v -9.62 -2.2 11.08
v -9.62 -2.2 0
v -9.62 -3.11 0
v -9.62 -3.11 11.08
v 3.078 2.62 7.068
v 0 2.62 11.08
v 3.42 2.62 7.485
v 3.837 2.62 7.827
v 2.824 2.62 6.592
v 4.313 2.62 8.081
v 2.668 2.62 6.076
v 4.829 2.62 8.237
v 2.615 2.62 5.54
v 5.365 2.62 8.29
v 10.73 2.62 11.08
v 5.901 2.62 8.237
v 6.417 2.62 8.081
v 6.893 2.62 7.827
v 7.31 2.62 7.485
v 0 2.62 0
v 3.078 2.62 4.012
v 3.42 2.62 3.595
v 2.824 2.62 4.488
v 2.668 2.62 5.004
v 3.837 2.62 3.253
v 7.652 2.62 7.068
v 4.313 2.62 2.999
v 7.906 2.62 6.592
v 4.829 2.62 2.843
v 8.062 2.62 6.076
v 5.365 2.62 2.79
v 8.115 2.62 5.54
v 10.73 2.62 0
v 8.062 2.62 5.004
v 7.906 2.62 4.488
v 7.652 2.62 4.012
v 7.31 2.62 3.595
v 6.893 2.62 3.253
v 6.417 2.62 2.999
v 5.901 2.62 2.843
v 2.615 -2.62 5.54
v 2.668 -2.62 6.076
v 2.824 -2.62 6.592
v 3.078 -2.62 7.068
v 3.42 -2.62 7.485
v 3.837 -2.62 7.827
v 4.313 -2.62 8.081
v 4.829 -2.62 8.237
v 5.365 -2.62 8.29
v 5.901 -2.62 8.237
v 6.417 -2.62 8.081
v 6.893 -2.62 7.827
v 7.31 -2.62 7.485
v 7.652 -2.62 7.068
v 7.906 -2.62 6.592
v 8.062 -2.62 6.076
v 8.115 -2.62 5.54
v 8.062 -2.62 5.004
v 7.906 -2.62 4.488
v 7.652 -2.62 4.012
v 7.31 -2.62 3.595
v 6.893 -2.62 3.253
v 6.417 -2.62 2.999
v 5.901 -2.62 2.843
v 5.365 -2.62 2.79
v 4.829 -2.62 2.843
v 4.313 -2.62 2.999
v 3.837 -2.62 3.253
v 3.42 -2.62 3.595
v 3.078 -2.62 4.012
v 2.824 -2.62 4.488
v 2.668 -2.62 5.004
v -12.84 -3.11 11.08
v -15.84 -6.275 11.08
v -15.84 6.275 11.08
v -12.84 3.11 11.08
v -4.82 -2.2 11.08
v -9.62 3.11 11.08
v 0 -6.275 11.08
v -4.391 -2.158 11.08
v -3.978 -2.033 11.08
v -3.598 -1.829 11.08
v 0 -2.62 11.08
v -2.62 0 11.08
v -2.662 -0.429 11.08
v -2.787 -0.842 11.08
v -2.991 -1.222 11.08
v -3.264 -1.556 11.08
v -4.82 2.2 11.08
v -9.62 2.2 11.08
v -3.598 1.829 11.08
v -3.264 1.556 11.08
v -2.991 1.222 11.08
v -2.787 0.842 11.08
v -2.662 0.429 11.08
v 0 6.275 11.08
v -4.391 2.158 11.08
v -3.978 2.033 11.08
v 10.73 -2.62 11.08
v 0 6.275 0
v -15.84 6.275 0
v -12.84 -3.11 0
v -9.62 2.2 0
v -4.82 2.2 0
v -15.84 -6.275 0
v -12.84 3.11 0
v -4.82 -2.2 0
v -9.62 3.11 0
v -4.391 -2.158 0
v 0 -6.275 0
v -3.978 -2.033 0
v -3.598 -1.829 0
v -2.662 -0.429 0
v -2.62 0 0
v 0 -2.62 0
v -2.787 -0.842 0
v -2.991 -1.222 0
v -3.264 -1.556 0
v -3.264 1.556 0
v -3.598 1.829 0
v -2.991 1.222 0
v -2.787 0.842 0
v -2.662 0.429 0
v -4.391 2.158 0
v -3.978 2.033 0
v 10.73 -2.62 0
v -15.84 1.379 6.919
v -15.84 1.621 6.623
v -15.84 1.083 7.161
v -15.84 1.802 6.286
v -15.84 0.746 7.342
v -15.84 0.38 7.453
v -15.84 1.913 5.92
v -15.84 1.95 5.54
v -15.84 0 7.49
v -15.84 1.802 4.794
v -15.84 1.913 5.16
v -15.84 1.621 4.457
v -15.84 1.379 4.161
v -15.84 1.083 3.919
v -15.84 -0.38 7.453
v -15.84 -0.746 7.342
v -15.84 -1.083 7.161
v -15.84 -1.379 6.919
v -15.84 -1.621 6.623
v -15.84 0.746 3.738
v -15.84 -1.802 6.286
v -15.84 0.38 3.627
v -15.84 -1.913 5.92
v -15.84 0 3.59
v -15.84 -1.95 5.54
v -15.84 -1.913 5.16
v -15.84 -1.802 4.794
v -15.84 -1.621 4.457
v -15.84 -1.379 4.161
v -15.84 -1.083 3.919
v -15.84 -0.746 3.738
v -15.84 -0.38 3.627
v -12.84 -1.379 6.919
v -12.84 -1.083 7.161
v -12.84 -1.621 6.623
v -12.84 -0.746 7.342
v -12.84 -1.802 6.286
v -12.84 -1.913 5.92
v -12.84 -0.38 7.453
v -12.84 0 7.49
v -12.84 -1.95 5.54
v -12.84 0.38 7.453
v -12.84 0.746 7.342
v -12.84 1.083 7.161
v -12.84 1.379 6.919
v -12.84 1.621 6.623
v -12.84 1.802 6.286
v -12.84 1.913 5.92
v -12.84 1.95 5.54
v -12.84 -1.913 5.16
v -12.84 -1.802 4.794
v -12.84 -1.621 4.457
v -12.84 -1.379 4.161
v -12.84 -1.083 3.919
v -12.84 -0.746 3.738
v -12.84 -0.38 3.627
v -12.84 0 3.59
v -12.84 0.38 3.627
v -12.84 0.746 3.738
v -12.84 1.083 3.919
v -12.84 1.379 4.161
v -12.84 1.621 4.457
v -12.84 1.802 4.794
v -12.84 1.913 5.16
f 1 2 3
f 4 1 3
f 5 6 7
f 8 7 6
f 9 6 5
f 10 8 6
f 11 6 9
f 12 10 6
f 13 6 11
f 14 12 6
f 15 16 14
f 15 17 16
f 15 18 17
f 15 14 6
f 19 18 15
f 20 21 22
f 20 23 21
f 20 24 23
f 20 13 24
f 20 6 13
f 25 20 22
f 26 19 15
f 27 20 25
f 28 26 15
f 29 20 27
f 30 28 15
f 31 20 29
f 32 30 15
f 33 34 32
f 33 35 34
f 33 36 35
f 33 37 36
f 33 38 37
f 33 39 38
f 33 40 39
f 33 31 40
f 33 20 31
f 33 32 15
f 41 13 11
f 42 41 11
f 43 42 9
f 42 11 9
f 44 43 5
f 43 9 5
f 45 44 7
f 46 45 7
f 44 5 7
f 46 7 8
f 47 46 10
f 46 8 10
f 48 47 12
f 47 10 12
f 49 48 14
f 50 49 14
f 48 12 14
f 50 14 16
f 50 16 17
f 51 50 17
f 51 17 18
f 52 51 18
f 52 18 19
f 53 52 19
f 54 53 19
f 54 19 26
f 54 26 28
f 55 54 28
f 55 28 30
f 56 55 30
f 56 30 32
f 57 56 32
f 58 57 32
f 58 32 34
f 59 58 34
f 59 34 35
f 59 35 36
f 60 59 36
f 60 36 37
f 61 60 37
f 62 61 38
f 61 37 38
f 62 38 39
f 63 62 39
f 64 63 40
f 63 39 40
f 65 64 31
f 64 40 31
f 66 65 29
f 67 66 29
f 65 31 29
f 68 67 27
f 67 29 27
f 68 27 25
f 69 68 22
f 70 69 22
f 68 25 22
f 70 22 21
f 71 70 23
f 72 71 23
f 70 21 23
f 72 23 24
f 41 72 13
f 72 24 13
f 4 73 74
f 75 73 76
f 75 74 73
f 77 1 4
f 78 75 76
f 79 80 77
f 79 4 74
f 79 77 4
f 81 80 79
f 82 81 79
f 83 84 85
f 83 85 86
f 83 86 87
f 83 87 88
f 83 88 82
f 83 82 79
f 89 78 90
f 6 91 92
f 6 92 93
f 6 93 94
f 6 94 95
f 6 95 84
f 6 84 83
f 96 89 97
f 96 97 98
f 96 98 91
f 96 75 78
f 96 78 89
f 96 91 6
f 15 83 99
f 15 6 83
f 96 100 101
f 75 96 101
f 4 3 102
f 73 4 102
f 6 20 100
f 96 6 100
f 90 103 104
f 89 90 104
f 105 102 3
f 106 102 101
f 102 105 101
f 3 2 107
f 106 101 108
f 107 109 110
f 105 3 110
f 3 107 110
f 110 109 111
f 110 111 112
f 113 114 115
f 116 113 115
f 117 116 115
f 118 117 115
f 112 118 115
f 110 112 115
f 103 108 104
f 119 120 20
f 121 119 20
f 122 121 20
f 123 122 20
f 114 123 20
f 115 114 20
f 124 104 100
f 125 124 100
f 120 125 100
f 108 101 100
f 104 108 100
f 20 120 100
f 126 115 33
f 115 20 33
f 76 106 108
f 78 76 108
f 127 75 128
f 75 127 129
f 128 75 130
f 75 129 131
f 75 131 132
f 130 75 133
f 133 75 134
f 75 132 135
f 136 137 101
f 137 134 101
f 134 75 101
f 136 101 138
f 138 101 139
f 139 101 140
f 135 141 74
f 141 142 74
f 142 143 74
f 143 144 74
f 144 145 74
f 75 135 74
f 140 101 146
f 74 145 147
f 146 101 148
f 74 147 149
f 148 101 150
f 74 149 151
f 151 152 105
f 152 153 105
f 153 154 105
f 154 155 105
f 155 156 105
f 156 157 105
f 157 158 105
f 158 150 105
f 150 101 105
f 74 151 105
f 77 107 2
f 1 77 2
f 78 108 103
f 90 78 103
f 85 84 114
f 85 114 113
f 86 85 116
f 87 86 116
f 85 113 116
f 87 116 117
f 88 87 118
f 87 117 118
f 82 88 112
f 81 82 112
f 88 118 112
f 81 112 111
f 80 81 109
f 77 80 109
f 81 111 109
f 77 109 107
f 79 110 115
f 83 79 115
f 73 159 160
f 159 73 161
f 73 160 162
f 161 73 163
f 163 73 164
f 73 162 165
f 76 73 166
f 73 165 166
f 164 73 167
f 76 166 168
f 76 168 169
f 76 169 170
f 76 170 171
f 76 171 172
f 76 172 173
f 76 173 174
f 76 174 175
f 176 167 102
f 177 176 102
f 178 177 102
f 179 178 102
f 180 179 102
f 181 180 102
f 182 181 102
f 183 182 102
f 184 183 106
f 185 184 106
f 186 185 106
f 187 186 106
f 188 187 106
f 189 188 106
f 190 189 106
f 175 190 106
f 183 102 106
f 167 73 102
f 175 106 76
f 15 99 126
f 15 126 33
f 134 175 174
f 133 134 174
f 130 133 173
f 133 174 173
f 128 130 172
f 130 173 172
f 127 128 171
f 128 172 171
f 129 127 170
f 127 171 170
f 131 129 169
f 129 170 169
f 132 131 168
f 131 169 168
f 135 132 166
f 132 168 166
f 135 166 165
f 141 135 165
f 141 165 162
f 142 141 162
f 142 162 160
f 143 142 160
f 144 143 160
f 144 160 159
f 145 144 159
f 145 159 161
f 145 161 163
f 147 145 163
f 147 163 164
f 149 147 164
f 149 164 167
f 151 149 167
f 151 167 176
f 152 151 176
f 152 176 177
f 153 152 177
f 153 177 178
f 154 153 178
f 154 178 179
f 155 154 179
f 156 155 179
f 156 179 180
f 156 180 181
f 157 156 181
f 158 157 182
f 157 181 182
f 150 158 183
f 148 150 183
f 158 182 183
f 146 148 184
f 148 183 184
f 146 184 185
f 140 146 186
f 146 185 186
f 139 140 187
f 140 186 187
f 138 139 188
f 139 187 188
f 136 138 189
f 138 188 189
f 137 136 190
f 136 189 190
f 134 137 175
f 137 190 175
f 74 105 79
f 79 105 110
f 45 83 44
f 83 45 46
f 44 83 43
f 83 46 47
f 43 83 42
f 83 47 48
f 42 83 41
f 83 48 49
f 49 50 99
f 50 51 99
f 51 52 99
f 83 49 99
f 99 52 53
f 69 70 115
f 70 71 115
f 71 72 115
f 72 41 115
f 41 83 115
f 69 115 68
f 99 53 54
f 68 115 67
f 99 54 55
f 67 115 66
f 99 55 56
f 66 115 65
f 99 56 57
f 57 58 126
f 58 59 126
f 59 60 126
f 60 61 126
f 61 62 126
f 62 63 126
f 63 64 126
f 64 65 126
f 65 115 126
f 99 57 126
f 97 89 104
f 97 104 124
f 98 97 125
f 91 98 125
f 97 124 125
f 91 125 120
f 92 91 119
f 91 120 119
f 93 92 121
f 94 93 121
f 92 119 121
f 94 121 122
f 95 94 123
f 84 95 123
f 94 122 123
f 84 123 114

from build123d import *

# Parameters (mm, degrees)
F0_W     = 10.73
F0_H     = 5.24
F1_DEPTH = 11.08
F3_D     = 3.9
F3_DEPTH = 12
F5_D     = 5.5


with BuildPart() as f1:
    # F0 (on Top) → F1 (new body)
    with BuildSketch(Plane.XY):
        Polygon((0, 6.275), (-15.84, 6.275), (-15.84, -6.275), (0, -6.275), (0, -2.62), (0, 2.62), align=None)
        with BuildLine():
            Line((-12.84, -3.11), (-12.84, 3.11))
            Line((-12.84, 3.11), (-9.62, 3.11))
            Line((-9.62, 3.11), (-9.62, 2.2))
            Line((-9.62, 2.2), (-4.82, 2.2))
            ThreePointArc((-4.82, 2.2), (-3.264365, 1.555635), (-2.62, 0))
            ThreePointArc((-2.62, 0), (-3.264365, -1.555635), (-4.82, -2.2))
            Line((-4.82, -2.2), (-9.62, -2.2))
            Line((-9.62, -2.2), (-9.62, -3.11))
            Line((-9.62, -3.11), (-12.84, -3.11))
        make_face(mode=Mode.SUBTRACT)
        with Locations((5.365, 0)):
            Rectangle(F0_W, F0_H)
    extrude(amount=F1_DEPTH)

    # F3
    with Locations(Plane(origin=(-15.84, 0, 0), x_dir=(0, -1, 0), z_dir=(-1, 0, 0))):
        with Locations((0, 5.54)):
            Hole(F3_D / 2, depth=F3_DEPTH)

    # F5 (through all)
    with Locations(Plane.XZ.offset(2.62)):
        with Locations((5.365, 5.54)):
            Hole(F5_D / 2)


solid = f1.part
